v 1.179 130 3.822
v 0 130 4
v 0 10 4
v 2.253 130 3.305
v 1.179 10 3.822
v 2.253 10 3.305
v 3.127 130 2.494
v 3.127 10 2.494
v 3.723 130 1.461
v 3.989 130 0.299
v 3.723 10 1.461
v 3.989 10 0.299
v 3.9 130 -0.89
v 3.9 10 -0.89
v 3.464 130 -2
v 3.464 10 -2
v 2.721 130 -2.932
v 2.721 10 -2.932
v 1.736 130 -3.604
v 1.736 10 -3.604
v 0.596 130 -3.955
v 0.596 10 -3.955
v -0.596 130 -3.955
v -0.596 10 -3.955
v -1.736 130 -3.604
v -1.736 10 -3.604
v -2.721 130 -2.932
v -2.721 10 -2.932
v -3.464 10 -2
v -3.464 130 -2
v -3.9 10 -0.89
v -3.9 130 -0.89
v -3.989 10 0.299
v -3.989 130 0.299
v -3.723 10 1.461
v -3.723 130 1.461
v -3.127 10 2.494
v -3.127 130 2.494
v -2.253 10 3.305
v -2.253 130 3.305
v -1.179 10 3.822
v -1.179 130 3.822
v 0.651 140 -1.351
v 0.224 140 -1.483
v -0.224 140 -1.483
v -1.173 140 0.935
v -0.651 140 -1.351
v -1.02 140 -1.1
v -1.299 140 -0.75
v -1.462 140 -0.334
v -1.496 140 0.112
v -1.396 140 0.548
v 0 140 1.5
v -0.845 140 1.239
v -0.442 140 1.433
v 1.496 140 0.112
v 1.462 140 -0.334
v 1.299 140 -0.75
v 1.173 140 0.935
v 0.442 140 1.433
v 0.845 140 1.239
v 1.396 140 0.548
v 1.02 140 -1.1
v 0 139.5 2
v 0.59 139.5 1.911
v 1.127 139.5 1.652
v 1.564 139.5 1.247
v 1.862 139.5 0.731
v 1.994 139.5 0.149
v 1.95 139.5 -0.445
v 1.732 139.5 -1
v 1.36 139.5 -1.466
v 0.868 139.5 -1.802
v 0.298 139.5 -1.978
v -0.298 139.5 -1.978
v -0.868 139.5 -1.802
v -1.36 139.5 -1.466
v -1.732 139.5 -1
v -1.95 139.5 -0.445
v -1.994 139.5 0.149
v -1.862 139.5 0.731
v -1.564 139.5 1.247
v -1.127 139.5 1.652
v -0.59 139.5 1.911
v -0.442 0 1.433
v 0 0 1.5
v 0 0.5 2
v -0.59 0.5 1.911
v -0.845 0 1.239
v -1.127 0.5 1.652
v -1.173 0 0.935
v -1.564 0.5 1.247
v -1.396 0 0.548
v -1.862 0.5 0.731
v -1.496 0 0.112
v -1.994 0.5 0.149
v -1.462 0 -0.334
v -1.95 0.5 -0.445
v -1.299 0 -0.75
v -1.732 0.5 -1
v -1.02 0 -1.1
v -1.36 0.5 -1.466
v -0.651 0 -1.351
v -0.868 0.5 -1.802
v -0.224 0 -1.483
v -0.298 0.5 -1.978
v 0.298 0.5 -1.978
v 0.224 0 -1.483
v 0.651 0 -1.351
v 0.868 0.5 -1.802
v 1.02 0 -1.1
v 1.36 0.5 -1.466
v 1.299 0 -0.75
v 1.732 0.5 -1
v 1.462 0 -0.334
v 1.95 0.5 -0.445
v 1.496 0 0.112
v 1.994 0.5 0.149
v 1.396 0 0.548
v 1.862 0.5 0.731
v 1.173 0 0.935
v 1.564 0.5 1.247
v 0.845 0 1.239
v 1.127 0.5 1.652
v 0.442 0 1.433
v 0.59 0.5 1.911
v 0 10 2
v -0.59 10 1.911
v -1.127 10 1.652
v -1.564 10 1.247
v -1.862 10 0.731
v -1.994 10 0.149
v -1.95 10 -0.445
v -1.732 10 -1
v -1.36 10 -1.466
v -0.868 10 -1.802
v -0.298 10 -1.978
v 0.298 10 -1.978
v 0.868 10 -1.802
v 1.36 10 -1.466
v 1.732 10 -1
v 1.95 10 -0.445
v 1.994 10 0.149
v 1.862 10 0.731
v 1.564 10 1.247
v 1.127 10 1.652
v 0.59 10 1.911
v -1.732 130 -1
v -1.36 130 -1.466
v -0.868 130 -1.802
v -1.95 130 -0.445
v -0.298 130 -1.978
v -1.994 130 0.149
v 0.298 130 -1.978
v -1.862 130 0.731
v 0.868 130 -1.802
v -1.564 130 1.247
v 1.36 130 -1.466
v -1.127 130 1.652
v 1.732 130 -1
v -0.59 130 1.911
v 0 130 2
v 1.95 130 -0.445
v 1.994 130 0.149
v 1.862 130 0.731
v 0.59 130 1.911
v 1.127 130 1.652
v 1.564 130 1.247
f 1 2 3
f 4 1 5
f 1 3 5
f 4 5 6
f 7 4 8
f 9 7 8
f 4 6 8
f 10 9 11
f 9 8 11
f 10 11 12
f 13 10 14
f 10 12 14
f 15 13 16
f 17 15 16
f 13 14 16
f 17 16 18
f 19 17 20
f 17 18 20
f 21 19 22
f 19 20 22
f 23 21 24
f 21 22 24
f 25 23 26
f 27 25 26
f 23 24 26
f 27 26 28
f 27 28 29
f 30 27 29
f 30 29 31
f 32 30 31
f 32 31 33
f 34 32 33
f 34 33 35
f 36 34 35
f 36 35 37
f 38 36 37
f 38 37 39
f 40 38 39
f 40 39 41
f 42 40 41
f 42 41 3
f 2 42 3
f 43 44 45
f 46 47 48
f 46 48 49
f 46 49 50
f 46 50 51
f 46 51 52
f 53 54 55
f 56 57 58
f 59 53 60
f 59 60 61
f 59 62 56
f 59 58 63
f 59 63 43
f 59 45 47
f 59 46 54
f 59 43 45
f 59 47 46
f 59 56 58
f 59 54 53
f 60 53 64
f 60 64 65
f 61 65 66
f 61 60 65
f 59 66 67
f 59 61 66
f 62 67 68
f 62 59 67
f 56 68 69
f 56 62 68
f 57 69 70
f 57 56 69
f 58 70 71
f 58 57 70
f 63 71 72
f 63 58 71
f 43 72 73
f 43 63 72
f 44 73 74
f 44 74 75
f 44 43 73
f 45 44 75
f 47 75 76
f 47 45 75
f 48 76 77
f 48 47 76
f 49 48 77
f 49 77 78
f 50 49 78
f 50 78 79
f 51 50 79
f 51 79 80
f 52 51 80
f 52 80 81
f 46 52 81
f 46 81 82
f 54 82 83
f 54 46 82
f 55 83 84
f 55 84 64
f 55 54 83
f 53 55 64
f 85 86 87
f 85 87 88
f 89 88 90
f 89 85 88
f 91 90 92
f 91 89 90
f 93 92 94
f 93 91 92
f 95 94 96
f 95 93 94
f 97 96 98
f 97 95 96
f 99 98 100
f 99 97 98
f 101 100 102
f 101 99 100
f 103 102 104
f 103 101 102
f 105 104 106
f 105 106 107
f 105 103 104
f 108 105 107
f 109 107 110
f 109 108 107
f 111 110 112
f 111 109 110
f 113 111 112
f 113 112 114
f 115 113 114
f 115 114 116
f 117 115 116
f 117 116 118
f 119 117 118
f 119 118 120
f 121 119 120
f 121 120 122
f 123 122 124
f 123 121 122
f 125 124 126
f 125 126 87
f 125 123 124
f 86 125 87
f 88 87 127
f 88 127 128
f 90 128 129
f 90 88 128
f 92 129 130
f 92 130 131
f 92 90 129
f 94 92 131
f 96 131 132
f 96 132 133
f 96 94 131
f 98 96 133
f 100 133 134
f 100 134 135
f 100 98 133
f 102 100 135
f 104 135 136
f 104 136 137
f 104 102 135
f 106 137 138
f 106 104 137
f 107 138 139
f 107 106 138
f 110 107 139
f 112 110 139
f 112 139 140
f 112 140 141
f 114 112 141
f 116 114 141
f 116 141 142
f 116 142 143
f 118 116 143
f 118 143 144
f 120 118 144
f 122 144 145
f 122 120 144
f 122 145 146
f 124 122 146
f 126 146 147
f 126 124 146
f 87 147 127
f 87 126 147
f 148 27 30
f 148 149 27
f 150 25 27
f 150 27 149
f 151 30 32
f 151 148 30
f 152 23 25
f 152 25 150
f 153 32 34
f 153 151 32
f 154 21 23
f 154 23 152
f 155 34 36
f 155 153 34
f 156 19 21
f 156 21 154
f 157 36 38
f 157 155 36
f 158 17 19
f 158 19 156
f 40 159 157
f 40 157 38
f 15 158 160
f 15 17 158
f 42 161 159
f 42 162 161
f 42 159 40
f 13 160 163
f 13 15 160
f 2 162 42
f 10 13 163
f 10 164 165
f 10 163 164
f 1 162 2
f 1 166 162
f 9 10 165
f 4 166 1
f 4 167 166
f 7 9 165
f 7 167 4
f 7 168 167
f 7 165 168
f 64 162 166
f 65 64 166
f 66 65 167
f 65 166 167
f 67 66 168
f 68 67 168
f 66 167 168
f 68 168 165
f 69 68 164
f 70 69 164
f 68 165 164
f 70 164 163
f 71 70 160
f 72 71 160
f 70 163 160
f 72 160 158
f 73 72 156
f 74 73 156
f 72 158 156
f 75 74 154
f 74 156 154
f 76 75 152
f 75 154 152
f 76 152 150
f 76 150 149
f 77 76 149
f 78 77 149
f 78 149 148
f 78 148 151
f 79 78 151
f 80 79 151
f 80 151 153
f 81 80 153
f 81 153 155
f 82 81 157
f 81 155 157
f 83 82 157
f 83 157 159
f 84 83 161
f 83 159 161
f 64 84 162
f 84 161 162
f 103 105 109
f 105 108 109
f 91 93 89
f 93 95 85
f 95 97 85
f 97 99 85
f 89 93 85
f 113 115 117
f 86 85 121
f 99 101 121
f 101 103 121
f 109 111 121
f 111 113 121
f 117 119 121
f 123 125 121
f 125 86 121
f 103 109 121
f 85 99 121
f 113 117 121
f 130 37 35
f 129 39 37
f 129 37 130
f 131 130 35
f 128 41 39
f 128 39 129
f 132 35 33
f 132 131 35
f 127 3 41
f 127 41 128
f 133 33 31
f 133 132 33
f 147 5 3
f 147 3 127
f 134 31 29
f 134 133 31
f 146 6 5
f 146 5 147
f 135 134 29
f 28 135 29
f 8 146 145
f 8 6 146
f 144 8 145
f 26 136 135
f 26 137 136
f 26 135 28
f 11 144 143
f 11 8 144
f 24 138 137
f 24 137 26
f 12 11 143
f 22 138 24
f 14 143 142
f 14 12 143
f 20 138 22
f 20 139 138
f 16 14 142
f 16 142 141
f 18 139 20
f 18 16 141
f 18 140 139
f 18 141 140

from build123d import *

# Parameters (mm, degrees)
SKETCH1_R      = 4
EXTRUDE1_DEPTH = 140
EXTRUDE2_START = -10
SKETCH2_R      = 4
SKETCH2_R_2    = 2
EXTRUDE2_DEPTH = 10
SKETCH3_R      = 4
SKETCH3_R_2    = 2
EXTRUDE3_DEPTH = 10
CHAMFER1_SIZE  = 0.5


with BuildPart() as part:
    # Sketch1 → Extrude1 (new body)
    with BuildSketch(Plane(origin=(0, 0, 0), x_dir=(1, 0, 0), z_dir=(0, 1, 0))):
        with Locations(Location((0, 0, 0), (0, 0, 270))):
            Circle(SKETCH1_R)
    extrude(amount=EXTRUDE1_DEPTH)

    # Sketch2 → Extrude2 (cut)
    with BuildSketch(Plane(origin=(0, 140, 0), x_dir=(1, 0, 0), z_dir=(0, 1, 0)).offset(EXTRUDE2_START)):
        with Locations(Location((0, 0, 0), (0, 0, 270))):
            Circle(SKETCH2_R)
        with Locations(Location((0, 0, 0), (0, 0, 270))):
            Circle(SKETCH2_R_2, mode=Mode.SUBTRACT)
    extrude(amount=EXTRUDE2_DEPTH, mode=Mode.SUBTRACT)

    # Sketch3 → Extrude3 (cut)
    with BuildSketch(Plane.XZ):
        with Locations(Location((0, 0, 0), (0, 0, 270))):
            Circle(SKETCH3_R)
        with Locations(Location((0, 0, 0), (0, 0, 90))):
            Circle(SKETCH3_R_2, mode=Mode.SUBTRACT)
    extrude(amount=-EXTRUDE3_DEPTH, mode=Mode.SUBTRACT)

    # Chamfer1
    chamfer1_edges = [part.edges().sort_by_distance(p)[0] for p in [
        (0, 0, -2),
        (0, 140, -2),
    ]]
    chamfer(chamfer1_edges, length=CHAMFER1_SIZE)


solid = part.part
